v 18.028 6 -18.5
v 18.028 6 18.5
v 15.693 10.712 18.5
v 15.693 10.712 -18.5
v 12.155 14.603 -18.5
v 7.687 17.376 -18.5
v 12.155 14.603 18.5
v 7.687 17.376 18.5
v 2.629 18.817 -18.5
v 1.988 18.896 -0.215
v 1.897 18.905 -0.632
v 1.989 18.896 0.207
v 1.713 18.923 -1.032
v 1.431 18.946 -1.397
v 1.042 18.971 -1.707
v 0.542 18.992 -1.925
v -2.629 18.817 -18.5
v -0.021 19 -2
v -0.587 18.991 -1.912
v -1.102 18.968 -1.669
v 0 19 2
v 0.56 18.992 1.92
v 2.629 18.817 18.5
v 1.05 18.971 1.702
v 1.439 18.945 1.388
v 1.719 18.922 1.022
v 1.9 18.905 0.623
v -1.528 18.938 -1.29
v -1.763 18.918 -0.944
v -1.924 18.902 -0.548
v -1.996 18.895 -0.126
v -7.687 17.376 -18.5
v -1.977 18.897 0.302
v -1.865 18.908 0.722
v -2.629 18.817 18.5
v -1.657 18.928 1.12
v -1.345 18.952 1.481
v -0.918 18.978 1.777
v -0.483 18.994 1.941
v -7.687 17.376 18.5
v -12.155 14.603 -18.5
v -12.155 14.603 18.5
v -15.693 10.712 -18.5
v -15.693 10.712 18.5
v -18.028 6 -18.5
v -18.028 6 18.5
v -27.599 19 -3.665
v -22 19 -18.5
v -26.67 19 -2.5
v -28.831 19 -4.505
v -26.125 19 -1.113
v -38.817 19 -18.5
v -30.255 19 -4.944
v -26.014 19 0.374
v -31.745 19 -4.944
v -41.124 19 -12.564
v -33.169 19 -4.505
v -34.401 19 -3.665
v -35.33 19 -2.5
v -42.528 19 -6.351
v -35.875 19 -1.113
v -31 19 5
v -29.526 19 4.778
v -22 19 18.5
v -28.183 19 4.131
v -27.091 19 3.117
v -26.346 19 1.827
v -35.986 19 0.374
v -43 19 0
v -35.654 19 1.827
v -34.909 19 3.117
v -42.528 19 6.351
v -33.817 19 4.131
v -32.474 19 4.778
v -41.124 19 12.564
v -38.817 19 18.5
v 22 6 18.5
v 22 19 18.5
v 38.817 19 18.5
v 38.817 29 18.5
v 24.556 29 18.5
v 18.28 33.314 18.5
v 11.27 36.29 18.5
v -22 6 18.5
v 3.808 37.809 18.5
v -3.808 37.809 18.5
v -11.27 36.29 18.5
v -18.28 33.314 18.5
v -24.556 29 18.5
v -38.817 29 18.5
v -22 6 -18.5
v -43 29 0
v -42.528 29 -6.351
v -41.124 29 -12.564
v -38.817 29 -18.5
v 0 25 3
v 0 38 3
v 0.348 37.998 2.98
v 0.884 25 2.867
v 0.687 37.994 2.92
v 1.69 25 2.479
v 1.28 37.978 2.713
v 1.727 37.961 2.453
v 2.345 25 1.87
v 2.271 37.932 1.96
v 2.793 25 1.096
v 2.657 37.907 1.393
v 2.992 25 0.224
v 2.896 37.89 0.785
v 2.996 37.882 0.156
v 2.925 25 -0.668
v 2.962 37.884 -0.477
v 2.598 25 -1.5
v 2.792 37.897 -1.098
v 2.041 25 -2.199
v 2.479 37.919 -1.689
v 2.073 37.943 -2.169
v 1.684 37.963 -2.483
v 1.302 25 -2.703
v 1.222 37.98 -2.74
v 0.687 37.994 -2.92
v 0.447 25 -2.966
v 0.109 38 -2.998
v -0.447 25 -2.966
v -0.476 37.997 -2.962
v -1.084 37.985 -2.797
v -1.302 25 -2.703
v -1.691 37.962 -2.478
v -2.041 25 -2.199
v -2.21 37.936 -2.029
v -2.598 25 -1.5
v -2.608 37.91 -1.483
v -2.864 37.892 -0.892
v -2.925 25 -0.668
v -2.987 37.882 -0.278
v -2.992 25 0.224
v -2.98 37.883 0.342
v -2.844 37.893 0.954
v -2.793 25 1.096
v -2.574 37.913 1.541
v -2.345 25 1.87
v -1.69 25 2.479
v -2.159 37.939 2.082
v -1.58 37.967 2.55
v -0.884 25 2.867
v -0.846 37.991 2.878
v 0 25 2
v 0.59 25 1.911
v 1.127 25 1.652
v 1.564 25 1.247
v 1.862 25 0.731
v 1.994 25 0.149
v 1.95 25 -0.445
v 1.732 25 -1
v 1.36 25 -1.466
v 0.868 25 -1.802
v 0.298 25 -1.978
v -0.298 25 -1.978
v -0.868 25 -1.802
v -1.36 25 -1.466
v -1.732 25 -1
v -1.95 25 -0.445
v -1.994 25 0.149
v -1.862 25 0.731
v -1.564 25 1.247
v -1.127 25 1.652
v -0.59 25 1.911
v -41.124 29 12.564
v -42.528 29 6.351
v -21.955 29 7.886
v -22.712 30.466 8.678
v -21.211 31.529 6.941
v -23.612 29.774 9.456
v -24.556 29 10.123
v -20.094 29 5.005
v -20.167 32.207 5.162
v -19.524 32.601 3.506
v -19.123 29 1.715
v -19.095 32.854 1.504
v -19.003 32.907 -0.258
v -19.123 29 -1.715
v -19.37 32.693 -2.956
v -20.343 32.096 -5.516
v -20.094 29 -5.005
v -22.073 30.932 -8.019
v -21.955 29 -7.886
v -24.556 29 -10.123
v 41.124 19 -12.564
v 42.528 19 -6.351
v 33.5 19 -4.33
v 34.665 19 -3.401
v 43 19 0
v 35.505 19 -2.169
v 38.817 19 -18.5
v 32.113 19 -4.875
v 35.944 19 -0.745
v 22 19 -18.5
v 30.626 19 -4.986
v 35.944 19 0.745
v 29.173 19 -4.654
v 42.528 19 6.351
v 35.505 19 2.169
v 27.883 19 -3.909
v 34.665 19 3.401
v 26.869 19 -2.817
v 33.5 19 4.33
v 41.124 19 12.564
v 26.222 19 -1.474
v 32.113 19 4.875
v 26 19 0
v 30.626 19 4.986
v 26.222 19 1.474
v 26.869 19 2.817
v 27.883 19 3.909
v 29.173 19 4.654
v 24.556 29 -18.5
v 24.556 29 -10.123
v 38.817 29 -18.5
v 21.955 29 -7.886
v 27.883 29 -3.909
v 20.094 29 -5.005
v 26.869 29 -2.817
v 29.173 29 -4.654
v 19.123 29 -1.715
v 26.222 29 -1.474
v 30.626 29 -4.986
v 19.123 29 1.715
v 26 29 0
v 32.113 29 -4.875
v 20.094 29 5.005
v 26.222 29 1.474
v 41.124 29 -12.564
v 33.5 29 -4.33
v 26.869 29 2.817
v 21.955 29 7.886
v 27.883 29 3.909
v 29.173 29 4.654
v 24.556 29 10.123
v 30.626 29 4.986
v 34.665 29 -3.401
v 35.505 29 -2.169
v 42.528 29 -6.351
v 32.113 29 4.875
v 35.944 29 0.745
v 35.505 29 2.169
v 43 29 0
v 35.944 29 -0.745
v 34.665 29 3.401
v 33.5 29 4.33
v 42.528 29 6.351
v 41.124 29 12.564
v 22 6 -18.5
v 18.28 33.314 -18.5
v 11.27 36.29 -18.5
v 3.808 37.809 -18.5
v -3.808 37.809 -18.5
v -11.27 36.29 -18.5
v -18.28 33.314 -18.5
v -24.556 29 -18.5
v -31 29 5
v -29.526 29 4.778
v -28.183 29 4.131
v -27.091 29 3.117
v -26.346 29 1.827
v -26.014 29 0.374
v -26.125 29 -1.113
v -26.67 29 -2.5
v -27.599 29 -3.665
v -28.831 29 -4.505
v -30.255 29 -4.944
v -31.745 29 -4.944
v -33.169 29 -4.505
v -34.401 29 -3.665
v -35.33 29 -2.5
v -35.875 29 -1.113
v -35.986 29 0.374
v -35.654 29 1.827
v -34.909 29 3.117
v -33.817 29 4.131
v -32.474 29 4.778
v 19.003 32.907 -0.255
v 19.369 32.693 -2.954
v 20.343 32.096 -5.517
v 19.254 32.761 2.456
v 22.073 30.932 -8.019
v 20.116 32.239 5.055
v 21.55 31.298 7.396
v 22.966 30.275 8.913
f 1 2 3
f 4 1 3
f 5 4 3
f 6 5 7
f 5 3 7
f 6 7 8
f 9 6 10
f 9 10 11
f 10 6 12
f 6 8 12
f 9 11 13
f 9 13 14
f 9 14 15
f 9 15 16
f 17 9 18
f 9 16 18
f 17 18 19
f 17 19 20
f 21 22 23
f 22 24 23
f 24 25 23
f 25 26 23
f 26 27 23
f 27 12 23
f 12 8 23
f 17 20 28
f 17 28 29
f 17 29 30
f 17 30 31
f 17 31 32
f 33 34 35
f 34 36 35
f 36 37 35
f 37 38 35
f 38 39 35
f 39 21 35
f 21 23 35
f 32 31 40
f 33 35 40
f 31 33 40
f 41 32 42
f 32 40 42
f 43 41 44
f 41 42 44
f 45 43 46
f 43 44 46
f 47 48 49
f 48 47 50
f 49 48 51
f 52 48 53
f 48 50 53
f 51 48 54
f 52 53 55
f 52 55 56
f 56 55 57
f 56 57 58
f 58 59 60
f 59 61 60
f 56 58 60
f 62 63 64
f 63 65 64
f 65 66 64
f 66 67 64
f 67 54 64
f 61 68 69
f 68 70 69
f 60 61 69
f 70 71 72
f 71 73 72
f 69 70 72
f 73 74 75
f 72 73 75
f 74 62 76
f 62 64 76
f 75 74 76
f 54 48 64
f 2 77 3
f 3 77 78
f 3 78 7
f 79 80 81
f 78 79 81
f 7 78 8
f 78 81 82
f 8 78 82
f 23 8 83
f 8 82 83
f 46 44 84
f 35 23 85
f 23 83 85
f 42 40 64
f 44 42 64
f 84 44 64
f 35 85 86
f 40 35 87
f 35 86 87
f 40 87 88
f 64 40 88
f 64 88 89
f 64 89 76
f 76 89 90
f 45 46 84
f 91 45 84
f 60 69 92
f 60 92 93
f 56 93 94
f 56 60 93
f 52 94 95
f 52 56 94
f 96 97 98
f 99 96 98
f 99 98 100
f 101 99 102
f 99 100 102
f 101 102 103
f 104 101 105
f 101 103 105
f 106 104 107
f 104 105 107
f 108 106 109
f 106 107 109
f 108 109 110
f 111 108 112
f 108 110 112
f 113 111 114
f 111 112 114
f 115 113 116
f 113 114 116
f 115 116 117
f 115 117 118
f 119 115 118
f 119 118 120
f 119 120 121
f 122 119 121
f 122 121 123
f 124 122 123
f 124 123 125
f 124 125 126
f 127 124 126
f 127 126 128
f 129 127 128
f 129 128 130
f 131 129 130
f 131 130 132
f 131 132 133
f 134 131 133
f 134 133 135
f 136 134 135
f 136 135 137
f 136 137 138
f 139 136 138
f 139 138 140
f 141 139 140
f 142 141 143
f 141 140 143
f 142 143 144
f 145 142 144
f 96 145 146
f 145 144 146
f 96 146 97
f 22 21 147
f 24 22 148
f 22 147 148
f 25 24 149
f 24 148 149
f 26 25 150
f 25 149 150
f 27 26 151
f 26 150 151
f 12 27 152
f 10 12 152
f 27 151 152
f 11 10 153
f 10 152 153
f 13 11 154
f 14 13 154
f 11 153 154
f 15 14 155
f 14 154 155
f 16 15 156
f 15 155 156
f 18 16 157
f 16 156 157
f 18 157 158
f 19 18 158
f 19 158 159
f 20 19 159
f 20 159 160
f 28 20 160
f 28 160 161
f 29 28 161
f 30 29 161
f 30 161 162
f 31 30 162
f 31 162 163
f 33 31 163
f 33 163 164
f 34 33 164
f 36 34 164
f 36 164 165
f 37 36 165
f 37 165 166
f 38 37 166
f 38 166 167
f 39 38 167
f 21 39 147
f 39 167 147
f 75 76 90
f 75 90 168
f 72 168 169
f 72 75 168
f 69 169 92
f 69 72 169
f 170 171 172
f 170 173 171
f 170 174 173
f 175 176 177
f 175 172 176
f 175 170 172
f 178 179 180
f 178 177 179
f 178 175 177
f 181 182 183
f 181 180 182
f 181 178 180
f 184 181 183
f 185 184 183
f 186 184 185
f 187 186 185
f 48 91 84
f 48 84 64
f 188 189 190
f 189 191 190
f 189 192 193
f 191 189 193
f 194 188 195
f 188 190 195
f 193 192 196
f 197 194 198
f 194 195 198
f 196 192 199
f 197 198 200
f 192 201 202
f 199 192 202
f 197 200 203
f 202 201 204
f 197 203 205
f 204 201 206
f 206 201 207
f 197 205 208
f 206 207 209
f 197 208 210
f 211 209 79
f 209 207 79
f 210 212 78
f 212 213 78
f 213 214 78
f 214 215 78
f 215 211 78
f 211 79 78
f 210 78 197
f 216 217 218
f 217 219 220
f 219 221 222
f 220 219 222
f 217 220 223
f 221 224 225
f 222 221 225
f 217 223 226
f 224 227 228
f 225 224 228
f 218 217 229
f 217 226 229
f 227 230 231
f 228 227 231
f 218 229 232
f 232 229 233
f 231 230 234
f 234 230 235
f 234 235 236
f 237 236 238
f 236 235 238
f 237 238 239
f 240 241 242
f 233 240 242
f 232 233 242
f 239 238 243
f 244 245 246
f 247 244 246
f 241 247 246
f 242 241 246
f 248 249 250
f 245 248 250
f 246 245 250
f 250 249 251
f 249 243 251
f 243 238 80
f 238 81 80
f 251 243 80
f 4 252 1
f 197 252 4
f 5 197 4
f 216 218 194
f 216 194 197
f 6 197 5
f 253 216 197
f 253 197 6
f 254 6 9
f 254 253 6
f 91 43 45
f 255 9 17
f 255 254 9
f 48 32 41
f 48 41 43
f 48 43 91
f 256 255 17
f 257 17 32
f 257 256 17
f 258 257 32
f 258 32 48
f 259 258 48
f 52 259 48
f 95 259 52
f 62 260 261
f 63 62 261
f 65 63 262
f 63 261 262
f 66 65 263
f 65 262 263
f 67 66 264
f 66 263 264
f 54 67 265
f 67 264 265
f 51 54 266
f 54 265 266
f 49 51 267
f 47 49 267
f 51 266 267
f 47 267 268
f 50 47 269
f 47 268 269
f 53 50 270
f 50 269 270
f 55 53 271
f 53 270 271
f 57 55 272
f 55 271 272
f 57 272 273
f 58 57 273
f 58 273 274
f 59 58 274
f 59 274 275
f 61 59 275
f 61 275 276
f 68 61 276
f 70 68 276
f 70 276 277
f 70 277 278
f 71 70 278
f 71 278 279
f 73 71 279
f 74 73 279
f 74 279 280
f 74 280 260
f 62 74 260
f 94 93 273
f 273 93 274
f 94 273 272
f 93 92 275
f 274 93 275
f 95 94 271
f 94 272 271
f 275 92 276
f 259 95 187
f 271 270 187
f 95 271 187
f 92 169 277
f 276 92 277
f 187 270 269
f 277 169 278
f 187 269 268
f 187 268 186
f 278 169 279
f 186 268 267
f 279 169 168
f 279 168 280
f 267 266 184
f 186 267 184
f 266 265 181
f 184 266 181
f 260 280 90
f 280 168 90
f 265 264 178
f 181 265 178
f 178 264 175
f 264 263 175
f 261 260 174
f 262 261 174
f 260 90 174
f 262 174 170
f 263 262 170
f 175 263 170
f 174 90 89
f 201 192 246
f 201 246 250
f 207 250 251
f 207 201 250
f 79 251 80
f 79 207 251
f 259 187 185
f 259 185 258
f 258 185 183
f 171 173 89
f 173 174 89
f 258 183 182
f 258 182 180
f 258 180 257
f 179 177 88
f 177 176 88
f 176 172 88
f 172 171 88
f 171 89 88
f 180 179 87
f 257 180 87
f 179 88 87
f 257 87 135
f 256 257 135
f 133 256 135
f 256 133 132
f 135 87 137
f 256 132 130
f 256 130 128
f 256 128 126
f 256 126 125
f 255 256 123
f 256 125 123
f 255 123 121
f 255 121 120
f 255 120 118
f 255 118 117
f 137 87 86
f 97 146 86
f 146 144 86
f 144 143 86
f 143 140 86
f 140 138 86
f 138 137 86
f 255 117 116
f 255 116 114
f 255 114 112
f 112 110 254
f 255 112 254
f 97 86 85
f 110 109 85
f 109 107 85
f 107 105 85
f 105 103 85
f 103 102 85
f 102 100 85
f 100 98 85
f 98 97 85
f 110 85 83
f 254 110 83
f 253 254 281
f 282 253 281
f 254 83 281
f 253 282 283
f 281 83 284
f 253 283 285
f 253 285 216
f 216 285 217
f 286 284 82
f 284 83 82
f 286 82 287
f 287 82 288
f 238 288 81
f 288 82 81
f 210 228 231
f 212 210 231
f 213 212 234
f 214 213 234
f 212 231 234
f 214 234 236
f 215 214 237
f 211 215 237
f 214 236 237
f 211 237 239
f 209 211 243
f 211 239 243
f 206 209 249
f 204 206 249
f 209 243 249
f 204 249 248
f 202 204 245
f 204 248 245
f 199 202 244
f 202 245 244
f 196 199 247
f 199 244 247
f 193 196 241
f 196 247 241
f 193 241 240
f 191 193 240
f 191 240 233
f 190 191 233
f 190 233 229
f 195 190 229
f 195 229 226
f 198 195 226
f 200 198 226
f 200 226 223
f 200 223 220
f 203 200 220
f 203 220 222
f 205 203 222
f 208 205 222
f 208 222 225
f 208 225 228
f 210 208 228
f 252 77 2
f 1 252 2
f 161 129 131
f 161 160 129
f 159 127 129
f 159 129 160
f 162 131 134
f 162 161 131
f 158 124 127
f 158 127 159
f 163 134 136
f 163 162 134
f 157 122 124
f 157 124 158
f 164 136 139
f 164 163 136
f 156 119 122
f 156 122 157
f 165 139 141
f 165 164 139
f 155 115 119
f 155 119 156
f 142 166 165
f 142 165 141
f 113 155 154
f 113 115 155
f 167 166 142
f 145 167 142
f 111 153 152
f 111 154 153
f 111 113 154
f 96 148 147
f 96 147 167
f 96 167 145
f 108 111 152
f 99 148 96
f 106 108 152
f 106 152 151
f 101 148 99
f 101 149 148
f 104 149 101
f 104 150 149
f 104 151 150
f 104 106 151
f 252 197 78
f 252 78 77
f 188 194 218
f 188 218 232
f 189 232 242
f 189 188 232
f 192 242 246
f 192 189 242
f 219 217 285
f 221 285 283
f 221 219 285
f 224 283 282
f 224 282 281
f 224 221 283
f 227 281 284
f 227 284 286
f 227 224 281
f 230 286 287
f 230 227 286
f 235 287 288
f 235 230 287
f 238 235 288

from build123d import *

# Parameters (mm, degrees)
BOSS_EXTRUDE1_DEPTH     = 18.5
CUT_EXTRUDE3_START      = -10
CUT_EXTRUDE3_DEPTH      = 10
SKETCH4_R               = 5
CUT_EXTRUDE4_DEPTH      = 53.156015952
SKETCH5_R               = 12
CUT_EXTRUDE5_DEPTH      = 37
SKETCH6_R               = 3
CUT_EXTRUDE6_DEPTH      = 13
CUT_EXTRUDE7_REACH      = 52.52
CUT_EXTRUDE7_END_RADIUS = 19
SKETCH7_R               = 2


# Read off the part's stored shape, not the designer's step: Cut-Extrude3
with BuildPart() as part:
    # Sketch2 → Boss-Extrude1 (new, symmetric)
    with BuildSketch(Plane.XY):
        with BuildLine():
            Line((-18.027756377, 6), (-22, 6))
            Line((-22, 6), (-22, 19))
            Line((-22, 19), (-43, 19))
            Line((-43, 19), (-43, 29))
            Line((-43, 29), (-24.556058316, 29))
            ThreePointArc((-24.556058316, 29), (0, 38), (24.556058316, 29))
            Line((24.556058316, 29), (43, 29))
            Line((43, 29), (43, 19))
            Line((43, 19), (22, 19))
            Line((22, 19), (22, 6))
            Line((22, 6), (18.027756377, 6))
            ThreePointArc((18.027756377, 6), (0, 19), (-18.027756377, 6))
        make_face()
    extrude(amount=BOSS_EXTRUDE1_DEPTH, both=True)

    # Cut-Extrude3 outline → Cut-Extrude3 (cut)
    with BuildSketch(Plane(origin=(0, 29, 0), x_dir=(1, 0, 0), z_dir=(0, 1, 0)).offset(CUT_EXTRUDE3_START)):
        with BuildLine():
            ThreePointArc((43, 0), (41.941183485, -9.483518751), (38.816877772, -18.5))
            Line((38.816877772, -18.5), (43, -18.5))
            Line((43, -18.5), (43, 0))
        make_face()
        with BuildLine():
            ThreePointArc((38.816877772, 18.5), (41.941183485, 9.483518751), (43, 0))
            Line((43, 0), (43, 18.5))
            Line((43, 18.5), (38.816877772, 18.5))
        make_face()
        with BuildLine():
            Line((-43, -18.5), (-38.816877772, -18.5))
            ThreePointArc((-38.816877772, -18.5), (-41.941183485, -9.483518751), (-43, 0))
            Line((-43, 0), (-43, -18.5))
        make_face()
        with BuildLine():
            Line((-43, 18.5), (-43, 0))
            ThreePointArc((-43, 0), (-41.941183485, 9.483518751), (-38.816877772, 18.5))
            Line((-38.816877772, 18.5), (-43, 18.5))
        make_face()
    extrude(amount=CUT_EXTRUDE3_DEPTH, mode=Mode.SUBTRACT)

    # Sketch4 → Cut-Extrude4 (cut, through all)
    with BuildSketch(Plane(origin=(0, 29, 0), x_dir=(1, 0, 0), z_dir=(0, 1, 0))):
        with Locations(Location((-31, 0, 0), (0, 0, 270))):
            Circle(SKETCH4_R)
        with Locations(Location((31, 0, 0), (0, 0, 180))):
            Circle(SKETCH4_R)
    extrude(amount=-CUT_EXTRUDE4_DEPTH, mode=Mode.SUBTRACT)

    # Sketch5 → Cut-Extrude5 (cut)
    with BuildSketch(Plane(origin=(0, 29, 0), x_dir=(1, 0, 0), z_dir=(0, 1, 0))):
        with Locations((-31, 0)):
            Circle(SKETCH5_R)
        with Locations((31, 0)):
            Circle(SKETCH5_R)
    extrude(amount=CUT_EXTRUDE5_DEPTH, mode=Mode.SUBTRACT)

    # Sketch6 → Cut-Extrude6 (cut)
    with BuildSketch(Plane(origin=(0, 38, 0), x_dir=(1, 0, 0), z_dir=(0, 1, 0))):
        with Locations(Location((0, 0, 0), (0, 0, 270))):
            Circle(SKETCH6_R)
    extrude(amount=-CUT_EXTRUDE6_DEPTH, mode=Mode.SUBTRACT)

    # Cut-Extrude7: up to this cylinder (the profile starts outside it)
    cut_extrude7_end = Plane(origin=(0, 0, 0), z_dir=(0, 0, -1)) * Cylinder(CUT_EXTRUDE7_END_RADIUS, 144.04, mode=Mode.PRIVATE)
    # Sketch7 → Cut-Extrude7 (cut, up to the surface)
    with BuildSketch(Plane(origin=(0, 25, 0), x_dir=(1, 0, 0), z_dir=(0, 1, 0)), mode=Mode.PRIVATE) as cut_extrude7_sk1:
        with Locations(Location((0, 0, 0), (0, 0, 270))):
            Circle(SKETCH7_R)
    cut_extrude7_tool1 = extrude(cut_extrude7_sk1.sketch, amount=-CUT_EXTRUDE7_REACH, mode=Mode.PRIVATE) - cut_extrude7_end
    add(cut_extrude7_tool1.solids().sort_by_distance((0, 25, 0))[0], mode=Mode.SUBTRACT)


solid = part.part
